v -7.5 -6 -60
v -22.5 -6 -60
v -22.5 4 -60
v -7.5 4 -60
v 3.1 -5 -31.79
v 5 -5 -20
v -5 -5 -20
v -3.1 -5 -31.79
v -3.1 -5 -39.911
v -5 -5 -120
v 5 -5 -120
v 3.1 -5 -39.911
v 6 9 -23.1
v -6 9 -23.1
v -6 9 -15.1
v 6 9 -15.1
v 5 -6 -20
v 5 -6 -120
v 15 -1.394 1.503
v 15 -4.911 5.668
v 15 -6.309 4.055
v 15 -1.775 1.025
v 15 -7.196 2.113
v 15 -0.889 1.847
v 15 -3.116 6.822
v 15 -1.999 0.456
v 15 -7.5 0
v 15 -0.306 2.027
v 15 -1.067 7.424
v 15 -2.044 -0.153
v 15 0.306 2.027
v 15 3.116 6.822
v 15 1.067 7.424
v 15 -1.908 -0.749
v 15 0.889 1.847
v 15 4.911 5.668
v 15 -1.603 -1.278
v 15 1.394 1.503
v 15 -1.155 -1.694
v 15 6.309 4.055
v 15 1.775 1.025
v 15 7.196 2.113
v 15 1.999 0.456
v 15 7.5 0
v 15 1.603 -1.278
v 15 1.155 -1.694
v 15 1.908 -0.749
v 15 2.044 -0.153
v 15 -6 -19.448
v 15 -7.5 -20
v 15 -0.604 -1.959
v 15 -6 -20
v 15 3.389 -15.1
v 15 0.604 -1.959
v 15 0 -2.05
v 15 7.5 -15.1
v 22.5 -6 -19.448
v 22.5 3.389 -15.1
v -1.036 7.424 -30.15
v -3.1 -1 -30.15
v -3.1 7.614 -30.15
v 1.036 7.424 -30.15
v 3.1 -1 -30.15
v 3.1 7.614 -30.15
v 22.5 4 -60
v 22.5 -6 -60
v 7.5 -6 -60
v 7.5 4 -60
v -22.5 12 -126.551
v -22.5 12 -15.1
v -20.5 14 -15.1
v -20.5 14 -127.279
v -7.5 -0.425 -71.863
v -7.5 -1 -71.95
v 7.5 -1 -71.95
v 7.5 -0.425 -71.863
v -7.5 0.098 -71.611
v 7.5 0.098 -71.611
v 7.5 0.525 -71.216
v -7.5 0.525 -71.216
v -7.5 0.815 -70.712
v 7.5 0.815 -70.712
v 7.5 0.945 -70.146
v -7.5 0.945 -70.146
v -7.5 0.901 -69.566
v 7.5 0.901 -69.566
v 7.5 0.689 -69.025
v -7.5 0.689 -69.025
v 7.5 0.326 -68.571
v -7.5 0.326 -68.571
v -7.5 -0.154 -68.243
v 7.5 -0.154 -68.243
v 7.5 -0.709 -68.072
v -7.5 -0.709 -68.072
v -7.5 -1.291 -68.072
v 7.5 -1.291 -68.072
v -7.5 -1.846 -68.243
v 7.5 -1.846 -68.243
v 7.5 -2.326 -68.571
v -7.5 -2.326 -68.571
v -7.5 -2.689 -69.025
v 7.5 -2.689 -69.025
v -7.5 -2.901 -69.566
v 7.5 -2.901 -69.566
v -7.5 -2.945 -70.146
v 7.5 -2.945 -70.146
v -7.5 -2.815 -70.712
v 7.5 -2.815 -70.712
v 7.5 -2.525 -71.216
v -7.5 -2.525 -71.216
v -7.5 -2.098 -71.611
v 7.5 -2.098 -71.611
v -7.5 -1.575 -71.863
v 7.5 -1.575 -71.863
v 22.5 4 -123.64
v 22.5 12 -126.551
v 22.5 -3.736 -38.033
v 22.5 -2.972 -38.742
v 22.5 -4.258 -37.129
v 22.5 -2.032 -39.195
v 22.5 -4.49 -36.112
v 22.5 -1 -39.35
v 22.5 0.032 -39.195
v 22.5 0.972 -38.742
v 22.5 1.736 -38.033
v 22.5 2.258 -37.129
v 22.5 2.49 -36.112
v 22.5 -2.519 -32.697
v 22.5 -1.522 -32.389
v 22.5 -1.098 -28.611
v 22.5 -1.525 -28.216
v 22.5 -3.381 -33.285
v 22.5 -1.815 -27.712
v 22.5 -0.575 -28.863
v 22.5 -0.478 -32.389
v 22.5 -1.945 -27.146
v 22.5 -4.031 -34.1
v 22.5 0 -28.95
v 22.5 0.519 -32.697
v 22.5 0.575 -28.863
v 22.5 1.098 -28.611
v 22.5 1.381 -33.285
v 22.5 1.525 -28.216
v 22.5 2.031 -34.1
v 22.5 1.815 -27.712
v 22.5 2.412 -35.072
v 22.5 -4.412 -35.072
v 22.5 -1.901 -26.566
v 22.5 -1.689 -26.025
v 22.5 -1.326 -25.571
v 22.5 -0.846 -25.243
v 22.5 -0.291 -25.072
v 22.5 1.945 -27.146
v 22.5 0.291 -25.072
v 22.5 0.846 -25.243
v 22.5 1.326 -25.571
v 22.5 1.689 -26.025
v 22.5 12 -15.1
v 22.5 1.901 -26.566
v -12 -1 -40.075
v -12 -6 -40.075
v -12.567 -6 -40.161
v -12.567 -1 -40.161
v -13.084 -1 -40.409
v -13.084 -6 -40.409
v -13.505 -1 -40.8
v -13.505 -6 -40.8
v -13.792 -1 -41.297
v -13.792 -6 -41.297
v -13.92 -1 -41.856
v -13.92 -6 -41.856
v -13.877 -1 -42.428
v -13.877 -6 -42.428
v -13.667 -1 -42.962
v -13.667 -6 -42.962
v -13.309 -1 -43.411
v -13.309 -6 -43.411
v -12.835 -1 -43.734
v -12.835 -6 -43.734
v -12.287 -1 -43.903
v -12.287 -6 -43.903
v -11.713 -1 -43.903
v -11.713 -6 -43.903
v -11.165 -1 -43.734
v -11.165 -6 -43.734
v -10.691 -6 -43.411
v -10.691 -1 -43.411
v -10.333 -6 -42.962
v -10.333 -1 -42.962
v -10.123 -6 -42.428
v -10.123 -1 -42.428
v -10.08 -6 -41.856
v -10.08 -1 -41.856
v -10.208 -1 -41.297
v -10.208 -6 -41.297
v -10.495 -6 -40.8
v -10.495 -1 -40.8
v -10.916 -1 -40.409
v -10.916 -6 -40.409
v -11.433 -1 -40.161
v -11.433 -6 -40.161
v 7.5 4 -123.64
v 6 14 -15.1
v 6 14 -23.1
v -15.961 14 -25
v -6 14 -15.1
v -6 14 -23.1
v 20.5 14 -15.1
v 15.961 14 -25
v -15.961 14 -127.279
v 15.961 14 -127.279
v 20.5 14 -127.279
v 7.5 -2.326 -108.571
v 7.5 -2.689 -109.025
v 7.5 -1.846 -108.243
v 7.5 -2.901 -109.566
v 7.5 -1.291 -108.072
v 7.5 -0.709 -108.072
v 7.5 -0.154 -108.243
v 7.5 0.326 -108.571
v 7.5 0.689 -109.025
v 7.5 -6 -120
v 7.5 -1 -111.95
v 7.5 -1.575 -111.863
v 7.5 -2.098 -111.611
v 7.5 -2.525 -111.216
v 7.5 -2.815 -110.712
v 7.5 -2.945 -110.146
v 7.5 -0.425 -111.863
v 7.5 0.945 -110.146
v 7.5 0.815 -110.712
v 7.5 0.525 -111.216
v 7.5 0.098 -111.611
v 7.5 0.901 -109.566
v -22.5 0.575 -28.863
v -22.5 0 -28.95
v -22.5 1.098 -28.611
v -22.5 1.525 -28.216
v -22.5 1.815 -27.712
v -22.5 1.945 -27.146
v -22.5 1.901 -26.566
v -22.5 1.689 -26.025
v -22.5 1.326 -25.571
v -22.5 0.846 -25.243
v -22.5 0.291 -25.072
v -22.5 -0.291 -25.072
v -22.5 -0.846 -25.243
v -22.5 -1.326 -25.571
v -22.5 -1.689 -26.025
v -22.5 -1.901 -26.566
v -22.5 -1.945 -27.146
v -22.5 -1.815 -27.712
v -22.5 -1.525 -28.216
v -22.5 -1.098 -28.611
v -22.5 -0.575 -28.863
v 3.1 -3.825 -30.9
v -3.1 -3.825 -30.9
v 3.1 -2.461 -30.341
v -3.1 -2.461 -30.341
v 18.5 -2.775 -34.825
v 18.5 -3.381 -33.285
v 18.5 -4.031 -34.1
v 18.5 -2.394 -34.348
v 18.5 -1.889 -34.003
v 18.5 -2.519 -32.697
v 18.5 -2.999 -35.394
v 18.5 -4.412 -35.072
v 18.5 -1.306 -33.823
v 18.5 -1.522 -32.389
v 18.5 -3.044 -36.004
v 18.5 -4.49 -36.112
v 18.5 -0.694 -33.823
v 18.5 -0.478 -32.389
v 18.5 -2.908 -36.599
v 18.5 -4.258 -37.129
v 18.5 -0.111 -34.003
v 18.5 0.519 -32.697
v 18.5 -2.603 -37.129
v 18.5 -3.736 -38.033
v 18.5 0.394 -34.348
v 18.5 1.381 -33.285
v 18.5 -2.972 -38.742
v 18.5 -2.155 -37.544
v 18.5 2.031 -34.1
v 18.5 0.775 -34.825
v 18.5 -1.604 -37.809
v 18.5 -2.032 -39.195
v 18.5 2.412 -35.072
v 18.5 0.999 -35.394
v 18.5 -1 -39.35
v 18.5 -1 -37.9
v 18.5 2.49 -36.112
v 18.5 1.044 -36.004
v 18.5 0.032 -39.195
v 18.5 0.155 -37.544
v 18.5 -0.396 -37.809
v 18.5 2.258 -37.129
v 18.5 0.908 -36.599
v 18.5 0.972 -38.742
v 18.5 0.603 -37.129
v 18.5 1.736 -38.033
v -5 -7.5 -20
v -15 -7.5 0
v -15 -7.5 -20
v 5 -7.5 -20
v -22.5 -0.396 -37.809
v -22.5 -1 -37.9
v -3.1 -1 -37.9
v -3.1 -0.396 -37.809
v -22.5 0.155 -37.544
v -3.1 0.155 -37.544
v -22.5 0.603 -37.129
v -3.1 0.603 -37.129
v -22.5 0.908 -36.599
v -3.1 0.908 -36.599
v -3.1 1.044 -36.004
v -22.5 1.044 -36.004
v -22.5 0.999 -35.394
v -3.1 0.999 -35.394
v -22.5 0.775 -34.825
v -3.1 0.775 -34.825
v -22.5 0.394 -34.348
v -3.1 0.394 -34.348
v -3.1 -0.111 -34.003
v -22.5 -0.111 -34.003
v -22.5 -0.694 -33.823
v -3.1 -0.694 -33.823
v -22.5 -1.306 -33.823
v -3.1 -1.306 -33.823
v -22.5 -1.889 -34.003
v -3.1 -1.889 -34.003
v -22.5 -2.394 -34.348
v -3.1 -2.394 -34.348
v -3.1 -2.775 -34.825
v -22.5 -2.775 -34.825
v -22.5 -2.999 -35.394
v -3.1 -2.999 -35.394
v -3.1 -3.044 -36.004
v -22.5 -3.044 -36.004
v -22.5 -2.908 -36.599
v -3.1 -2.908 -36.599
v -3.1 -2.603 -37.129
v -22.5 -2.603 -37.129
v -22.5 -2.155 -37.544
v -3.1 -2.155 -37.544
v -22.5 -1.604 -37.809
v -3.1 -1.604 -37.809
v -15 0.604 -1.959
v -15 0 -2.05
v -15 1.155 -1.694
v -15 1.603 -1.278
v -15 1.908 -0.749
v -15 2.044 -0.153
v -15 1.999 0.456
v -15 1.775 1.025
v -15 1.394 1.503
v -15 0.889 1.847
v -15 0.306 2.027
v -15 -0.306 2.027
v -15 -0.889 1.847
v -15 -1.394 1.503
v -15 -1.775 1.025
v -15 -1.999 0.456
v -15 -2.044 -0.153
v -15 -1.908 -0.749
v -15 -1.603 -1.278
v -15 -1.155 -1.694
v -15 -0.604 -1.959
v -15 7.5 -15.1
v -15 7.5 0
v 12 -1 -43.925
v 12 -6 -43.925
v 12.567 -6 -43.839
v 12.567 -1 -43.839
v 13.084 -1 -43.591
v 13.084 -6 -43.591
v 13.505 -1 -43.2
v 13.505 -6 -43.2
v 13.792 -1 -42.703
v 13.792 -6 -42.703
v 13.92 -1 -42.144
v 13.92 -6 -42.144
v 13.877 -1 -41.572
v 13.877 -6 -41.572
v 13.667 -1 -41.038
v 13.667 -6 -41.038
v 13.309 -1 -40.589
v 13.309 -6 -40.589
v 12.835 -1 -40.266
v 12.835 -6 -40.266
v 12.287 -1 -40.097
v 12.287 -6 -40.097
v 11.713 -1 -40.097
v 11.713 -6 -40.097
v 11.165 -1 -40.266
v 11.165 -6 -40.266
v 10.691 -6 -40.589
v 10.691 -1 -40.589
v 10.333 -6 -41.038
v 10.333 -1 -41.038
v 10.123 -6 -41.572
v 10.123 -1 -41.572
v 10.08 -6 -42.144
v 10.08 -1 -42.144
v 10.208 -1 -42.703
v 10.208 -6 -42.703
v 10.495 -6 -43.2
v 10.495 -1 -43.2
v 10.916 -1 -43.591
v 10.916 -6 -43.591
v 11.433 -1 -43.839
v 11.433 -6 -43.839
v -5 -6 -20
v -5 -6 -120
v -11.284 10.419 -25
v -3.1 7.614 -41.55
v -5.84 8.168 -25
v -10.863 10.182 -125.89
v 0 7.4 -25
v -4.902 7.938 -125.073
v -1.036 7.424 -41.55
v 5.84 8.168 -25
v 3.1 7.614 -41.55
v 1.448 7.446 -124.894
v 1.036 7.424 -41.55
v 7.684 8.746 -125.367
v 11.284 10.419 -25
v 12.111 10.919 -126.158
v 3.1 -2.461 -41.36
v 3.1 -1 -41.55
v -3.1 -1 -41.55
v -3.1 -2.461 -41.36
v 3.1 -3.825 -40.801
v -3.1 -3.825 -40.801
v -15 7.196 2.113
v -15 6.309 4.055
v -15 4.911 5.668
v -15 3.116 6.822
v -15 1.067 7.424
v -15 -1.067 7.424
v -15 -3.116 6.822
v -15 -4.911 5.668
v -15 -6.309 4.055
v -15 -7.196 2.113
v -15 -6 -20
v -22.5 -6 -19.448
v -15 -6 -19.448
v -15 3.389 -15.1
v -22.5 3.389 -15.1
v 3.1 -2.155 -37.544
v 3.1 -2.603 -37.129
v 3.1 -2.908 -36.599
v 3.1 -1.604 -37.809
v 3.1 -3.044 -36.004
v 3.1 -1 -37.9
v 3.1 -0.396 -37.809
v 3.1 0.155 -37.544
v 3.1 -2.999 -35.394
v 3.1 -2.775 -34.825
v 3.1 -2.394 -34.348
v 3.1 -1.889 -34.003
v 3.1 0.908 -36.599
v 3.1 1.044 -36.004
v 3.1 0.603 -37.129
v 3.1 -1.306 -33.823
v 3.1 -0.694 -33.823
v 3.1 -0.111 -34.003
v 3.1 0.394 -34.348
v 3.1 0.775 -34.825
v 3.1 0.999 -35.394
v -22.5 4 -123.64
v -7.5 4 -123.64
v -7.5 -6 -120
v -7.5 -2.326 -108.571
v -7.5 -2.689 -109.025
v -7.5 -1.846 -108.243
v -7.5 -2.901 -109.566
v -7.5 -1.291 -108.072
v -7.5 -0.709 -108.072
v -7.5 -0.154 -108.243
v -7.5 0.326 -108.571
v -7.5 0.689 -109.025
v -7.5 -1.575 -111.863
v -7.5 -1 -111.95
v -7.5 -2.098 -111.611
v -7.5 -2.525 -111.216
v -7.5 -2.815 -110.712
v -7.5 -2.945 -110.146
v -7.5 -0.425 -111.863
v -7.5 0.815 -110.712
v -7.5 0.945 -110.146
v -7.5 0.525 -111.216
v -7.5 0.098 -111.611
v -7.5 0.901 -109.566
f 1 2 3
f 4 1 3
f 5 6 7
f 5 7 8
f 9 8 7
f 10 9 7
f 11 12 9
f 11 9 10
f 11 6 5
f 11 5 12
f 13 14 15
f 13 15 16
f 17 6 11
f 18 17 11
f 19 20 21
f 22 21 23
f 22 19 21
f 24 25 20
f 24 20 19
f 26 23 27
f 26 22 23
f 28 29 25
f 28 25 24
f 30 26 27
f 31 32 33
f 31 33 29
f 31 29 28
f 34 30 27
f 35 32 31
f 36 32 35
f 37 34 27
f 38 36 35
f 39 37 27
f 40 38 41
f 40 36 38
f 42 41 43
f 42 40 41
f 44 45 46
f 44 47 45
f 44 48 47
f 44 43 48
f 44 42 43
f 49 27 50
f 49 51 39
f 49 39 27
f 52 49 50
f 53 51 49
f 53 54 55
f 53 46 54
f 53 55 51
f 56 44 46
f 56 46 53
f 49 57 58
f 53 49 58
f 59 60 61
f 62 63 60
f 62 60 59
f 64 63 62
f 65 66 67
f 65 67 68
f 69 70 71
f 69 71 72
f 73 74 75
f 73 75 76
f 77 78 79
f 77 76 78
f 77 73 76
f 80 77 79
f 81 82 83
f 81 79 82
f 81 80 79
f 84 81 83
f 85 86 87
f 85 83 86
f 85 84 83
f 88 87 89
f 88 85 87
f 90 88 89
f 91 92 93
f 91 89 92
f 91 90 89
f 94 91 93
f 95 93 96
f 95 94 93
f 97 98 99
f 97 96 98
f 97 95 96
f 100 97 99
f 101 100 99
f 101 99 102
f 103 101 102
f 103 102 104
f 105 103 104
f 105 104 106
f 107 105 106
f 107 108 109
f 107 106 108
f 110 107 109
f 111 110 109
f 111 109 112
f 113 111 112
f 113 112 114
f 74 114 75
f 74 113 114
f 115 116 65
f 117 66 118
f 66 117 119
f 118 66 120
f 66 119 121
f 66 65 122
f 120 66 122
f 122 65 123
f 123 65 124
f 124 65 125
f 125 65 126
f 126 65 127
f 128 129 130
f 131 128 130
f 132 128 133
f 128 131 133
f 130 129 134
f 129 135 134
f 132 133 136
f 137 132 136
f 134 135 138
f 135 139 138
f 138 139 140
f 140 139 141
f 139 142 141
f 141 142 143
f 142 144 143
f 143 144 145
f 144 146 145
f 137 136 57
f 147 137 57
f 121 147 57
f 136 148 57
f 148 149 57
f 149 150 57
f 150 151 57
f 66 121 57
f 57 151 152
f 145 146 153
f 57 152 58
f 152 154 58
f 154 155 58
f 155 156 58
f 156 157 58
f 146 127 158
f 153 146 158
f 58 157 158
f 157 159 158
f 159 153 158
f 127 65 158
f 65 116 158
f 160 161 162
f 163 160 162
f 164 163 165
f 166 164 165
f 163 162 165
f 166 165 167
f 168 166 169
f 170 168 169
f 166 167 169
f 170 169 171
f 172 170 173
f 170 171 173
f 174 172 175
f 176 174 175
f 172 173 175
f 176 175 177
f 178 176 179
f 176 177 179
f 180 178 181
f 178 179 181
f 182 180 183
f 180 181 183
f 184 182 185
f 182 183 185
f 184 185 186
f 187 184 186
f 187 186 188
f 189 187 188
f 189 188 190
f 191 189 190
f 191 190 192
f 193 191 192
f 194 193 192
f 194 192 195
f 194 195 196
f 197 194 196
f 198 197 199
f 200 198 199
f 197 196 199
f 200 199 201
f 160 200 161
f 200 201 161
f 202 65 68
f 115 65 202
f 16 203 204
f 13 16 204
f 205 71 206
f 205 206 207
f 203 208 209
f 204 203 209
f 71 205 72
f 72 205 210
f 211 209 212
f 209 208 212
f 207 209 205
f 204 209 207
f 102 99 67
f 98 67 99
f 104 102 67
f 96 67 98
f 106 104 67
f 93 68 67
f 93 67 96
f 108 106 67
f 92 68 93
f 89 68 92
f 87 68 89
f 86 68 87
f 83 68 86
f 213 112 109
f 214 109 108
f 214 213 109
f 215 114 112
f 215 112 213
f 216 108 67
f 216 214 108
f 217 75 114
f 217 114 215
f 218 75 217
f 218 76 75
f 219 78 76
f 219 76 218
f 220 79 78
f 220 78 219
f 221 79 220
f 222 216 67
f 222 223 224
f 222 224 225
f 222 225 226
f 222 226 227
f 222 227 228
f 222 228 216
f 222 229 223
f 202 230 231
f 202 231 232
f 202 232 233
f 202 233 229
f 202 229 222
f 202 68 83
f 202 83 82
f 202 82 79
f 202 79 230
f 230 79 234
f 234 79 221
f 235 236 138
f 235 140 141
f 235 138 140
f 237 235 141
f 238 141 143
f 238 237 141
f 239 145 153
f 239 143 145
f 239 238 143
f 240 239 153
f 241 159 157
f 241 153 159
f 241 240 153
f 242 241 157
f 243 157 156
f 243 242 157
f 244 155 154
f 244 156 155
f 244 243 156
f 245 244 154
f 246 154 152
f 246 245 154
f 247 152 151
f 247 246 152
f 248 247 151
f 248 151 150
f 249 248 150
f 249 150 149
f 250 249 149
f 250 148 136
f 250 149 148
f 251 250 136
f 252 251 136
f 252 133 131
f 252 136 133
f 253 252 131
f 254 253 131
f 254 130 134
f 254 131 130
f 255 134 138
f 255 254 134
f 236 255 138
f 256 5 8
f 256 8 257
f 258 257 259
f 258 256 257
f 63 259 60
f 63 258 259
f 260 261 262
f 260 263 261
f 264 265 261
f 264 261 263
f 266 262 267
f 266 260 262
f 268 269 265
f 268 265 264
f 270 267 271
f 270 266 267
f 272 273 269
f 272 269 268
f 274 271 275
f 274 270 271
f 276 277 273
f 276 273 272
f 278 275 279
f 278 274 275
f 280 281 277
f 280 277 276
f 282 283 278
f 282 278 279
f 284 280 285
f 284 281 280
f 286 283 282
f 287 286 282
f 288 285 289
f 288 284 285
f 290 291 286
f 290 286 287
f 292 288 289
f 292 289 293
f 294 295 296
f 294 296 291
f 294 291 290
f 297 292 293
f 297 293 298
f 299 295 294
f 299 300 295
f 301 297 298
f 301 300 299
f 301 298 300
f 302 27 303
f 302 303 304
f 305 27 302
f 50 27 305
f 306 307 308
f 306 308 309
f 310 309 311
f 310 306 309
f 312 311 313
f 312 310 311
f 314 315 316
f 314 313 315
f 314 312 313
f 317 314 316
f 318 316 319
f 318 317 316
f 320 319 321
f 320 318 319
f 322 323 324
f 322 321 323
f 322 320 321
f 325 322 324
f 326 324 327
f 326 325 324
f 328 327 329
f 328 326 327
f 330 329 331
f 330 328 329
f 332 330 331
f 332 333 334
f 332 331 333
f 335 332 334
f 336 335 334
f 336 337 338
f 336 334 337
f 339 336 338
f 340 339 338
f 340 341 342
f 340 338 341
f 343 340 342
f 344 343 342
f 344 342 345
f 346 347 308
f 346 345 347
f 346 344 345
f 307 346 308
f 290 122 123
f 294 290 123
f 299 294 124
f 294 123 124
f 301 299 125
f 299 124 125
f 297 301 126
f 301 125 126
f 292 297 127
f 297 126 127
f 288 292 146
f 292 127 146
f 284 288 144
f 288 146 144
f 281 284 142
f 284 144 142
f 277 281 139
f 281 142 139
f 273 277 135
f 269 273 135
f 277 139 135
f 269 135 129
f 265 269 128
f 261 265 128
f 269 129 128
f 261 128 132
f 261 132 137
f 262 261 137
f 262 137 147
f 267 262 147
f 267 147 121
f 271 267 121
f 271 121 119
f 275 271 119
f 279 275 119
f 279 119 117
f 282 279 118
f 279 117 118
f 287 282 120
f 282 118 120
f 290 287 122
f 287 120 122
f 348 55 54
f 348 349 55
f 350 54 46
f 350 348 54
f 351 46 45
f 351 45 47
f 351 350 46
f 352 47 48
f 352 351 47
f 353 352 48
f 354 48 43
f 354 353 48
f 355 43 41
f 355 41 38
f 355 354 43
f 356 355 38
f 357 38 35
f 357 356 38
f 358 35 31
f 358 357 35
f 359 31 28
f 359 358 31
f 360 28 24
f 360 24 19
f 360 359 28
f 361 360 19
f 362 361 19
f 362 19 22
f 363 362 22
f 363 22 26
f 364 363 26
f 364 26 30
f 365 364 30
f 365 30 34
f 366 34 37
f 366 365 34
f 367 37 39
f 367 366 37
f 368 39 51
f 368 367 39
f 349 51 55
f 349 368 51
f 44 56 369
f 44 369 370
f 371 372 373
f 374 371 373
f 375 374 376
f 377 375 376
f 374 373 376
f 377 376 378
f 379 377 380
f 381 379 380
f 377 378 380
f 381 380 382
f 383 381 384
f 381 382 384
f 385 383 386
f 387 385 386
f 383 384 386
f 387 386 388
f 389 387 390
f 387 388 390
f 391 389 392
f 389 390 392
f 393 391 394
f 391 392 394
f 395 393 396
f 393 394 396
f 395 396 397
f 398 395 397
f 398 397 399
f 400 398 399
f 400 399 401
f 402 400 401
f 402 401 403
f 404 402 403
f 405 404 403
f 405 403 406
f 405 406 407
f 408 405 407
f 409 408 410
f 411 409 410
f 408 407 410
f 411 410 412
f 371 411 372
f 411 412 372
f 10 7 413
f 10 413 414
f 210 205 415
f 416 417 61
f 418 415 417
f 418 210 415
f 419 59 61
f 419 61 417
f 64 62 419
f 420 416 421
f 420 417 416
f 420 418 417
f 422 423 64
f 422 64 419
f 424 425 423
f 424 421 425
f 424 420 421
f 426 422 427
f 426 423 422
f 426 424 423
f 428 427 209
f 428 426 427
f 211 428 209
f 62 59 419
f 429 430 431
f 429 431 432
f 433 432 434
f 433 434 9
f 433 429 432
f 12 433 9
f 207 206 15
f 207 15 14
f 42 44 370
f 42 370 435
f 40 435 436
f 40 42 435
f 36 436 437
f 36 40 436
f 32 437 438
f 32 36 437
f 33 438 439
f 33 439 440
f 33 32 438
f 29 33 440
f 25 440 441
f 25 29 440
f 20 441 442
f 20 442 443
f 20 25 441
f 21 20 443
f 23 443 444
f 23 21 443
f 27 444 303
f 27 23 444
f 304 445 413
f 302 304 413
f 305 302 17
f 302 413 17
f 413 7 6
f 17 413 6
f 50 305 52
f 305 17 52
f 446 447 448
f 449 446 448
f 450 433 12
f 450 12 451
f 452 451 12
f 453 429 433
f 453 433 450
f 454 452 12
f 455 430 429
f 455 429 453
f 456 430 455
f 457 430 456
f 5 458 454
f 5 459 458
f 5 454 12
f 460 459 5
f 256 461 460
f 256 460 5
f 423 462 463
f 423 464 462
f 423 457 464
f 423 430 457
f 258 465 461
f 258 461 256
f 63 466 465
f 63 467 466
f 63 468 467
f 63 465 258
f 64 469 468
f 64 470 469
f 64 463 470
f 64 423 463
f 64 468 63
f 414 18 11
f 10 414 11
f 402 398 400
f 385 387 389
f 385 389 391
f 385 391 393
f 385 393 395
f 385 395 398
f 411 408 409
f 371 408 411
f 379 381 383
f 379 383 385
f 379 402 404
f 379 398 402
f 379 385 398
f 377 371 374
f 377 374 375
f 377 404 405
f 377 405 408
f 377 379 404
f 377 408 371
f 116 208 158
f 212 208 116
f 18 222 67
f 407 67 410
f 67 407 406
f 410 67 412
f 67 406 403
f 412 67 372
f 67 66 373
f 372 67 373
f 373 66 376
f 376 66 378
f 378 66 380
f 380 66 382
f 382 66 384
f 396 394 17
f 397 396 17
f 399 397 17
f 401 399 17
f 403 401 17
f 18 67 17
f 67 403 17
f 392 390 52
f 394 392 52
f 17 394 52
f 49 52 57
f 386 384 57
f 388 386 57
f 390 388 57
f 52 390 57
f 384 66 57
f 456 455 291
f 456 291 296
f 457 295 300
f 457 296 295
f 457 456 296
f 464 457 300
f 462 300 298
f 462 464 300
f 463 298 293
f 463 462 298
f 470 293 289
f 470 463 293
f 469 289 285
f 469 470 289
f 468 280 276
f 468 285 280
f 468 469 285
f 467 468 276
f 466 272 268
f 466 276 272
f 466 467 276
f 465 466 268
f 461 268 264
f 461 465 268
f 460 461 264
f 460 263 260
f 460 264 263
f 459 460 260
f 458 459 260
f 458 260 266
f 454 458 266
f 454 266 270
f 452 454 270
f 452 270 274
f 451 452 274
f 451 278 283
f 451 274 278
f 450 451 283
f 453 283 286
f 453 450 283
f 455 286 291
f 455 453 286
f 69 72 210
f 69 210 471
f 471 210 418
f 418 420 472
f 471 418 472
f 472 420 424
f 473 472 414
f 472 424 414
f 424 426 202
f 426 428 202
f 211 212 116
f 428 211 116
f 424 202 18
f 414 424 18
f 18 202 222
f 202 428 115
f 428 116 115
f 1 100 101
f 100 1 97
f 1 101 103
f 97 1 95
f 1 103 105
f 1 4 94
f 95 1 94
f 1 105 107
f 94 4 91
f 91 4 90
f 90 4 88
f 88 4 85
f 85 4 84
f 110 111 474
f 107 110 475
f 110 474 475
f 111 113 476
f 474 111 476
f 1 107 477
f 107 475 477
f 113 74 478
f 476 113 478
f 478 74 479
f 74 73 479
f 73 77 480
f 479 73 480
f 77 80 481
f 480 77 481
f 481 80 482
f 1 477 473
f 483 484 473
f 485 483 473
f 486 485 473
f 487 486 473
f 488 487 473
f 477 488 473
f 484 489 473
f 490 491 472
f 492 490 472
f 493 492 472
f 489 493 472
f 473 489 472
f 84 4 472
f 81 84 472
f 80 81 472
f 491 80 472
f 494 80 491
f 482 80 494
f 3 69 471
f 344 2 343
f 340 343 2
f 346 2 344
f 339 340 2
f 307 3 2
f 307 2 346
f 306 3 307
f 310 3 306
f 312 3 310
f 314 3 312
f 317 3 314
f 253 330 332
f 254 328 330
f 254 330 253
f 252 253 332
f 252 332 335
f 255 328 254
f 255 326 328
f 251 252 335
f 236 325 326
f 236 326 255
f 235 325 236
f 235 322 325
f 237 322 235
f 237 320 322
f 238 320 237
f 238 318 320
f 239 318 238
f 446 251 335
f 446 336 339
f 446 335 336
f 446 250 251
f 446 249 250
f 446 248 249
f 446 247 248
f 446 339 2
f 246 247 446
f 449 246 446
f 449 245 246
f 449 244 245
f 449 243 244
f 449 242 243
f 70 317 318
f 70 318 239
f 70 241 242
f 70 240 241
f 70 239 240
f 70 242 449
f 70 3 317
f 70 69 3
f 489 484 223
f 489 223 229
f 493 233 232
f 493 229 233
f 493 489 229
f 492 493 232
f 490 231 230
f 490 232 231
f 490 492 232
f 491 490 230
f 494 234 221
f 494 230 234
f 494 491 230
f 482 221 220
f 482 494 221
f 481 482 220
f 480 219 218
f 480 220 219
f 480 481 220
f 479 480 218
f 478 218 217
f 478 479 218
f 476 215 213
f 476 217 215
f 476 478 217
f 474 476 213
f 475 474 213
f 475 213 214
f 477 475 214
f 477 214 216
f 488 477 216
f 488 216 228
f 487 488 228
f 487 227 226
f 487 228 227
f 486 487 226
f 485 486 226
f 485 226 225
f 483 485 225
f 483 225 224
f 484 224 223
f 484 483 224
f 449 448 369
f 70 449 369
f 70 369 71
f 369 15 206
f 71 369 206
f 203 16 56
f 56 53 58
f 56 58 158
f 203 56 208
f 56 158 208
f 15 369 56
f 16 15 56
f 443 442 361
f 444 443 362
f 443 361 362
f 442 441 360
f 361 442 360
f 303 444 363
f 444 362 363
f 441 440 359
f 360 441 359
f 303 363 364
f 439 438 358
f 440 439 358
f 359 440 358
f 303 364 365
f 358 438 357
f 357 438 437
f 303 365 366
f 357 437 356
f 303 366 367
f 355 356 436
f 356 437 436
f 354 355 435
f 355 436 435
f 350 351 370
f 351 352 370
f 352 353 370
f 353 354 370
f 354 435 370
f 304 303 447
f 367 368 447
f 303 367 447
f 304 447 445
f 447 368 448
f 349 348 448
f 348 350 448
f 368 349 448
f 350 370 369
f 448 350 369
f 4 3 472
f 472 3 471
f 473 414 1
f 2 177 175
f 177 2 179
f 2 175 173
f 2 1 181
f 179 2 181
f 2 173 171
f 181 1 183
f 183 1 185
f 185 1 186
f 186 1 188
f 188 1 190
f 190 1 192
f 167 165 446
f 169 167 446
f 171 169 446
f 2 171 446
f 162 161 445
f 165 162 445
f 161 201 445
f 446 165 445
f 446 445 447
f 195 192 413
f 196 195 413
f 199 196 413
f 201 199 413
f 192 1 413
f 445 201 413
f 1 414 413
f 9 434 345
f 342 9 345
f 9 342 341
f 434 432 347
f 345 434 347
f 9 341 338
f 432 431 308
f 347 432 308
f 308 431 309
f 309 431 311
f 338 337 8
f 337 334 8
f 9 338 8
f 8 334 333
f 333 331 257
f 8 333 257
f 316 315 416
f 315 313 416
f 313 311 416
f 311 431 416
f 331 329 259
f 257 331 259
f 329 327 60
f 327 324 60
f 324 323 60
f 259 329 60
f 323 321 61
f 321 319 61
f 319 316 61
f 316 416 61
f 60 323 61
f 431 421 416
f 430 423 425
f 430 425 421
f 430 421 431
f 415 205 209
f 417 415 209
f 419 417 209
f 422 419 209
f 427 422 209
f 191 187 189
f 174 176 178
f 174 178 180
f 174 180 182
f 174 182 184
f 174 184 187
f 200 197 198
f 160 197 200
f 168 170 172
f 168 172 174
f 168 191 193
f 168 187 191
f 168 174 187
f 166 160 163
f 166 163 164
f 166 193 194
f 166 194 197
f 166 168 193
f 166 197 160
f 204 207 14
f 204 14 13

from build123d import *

# Parameters (mm, degrees)
SKETCH_1_R               = 7.5
SKETCH_1_R_2             = 2.05
EXTRUDE_1_DEPTH          = 15
EXTRUDE_2_DEPTH          = 22.5
SKETCH_3_R               = 22.6
CUT_EXTRUDE_1_DEPTH      = 125
SKETCH_5_W               = 80
SKETCH_5_H               = 15
CUT_EXTRUDE_2_DEPTH      = 15
CUT_EXTRUDE_3_DEPTH      = 131.008833765
CUT_EXTRUDE_3_DEPTH_BACK = 131.008833765
SKETCH_6_R               = 1.95
CUT_EXTRUDE_4_DEPTH      = 131.008833765
CUT_EXTRUDE_4_DEPTH_BACK = 131.008833765
SKETCH_10_R              = 1.95
CUT_EXTRUDE_5_DEPTH      = 131.008833765
CUT_EXTRUDE_5_DEPTH_BACK = 131.008833765
SKETCH_11_R              = 2.05
CUT_EXTRUDE_6_DEPTH      = 3.1
SKETCH_16_W              = 100
SKETCH_16_H              = 15.085035438
CUT_EXTRUDE_7_DEPTH      = 5
CHAMFER_1_SIZE           = 2
SKETCH_17_R              = 3.5
CUT_EXTRUDE_8_DEPTH      = 4
SKETCH_19_W              = 12
SKETCH_19_H              = 8
CUT_EXTRUDE_10_DEPTH     = 5
SKETCH_20_W              = 30
SKETCH_20_H              = 18.196576595
CUT_EXTRUDE_12_DEPTH     = 1.5
SKETCH_21_R              = 1.925
CUT_EXTRUDE_13_DEPTH     = 5


with BuildPart() as part:
    # 스케치1 → 보스-돌출1 (new, symmetric)
    # profile 1 of 2: a face of its own
    with BuildSketch(Plane(origin=(0, 0, 0), x_dir=(0, 0, -1), z_dir=(1, 0, 0))):
        with BuildLine():
            ThreePointArc((7.5, 0), (5.303300859, -5.303300859), (0, -7.5))
            Line((0, -7.5), (37.938480529, -7.5))
            Line((37.938480529, -7.5), (36.613399157, 7.5))
            Line((36.613399157, 7.5), (0, 7.5))
            ThreePointArc((0, 7.5), (5.303300859, 5.303300859), (7.5, 0))
        make_face()
    # profile 2 of 2: a face of its own
    with BuildSketch(Plane(origin=(0, 0, 0), x_dir=(0, 0, -1), z_dir=(1, 0, 0))):
        Circle(SKETCH_1_R)
        Circle(SKETCH_1_R_2, mode=Mode.SUBTRACT)
    extrude(amount=EXTRUDE_1_DEPTH, both=True)

    # 스케치2 → 보스-돌출2 (add, symmetric)
    with BuildSketch(Plane(origin=(0, 0, 0), x_dir=(0, 0, -1), z_dir=(1, 0, 0))):
        Polygon((15.1, 3.389248282), (15.1, 14), (127.279404685, 14), (120, -6), (19.447603562, -6), align=None)
    extrude(amount=EXTRUDE_2_DEPTH, both=True)

    # 스케치3 → 컷-돌출1 (cut)
    with BuildSketch(Plane.XY.offset(-150)):
        with Locations((0, 30)):
            Circle(SKETCH_3_R)
    extrude(amount=CUT_EXTRUDE_1_DEPTH, mode=Mode.SUBTRACT)

    # 스케치5 → 컷-돌출2 (cut)
    with BuildSketch(Plane(origin=(22.5, 0, 0), x_dir=(0, 0, -1), z_dir=(1, 0, 0))):
        with Locations((100, -3.5)):
            Rectangle(SKETCH_5_W, SKETCH_5_H)
    cut_extrude_2 = extrude(amount=-CUT_EXTRUDE_2_DEPTH, mode=Mode.SUBTRACT)

    # 대칭 복사1: 컷-돌출2 across plane
    add(cut_extrude_2.mirror(Plane(origin=(0, 0, 0), x_dir=(0, 0, 1), z_dir=(1, 0, 0))), mode=Mode.SUBTRACT)

    # 스케치6 → 컷-돌출3 (cut, two sides: drawn at the far end of the back side and taken through both)
    with BuildSketch(Plane(origin=(0, 0, 0), x_dir=(0, 0, -1), z_dir=(1, 0, 0)).offset(-CUT_EXTRUDE_3_DEPTH_BACK)):
        with Locations((70, -1)):
            Circle(SKETCH_6_R)
        with Locations((110, -1)):
            Circle(SKETCH_6_R)
    extrude(amount=CUT_EXTRUDE_3_DEPTH + CUT_EXTRUDE_3_DEPTH_BACK, mode=Mode.SUBTRACT)

    # 스케치10 → 컷-돌출4 (cut, two sides: drawn at the far end of the back side and taken through both)
    with BuildSketch(Plane(origin=(0, 0, 0), x_dir=(0, 0, -1), z_dir=(1, 0, 0)).offset(-CUT_EXTRUDE_4_DEPTH_BACK)):
        with Locations((27, 0)):
            Circle(SKETCH_10_R)
    extrude(amount=CUT_EXTRUDE_4_DEPTH + CUT_EXTRUDE_4_DEPTH_BACK, mode=Mode.SUBTRACT)

    # 스케치11 → 컷-돌출5 (cut, two sides: drawn at the far end of the back side and taken through both)
    with BuildSketch(Plane(origin=(0, 0, 0), x_dir=(0, 0, -1), z_dir=(1, 0, 0)).offset(-CUT_EXTRUDE_5_DEPTH_BACK)):
        with Locations((35.850364983, -1)):
            Circle(SKETCH_11_R)
    extrude(amount=CUT_EXTRUDE_5_DEPTH + CUT_EXTRUDE_5_DEPTH_BACK, mode=Mode.SUBTRACT)

    # 스케치12 → 컷-돌출6 (cut, symmetric)
    with BuildSketch(Plane(origin=(0, 0, 0), x_dir=(0, 0, -1), z_dir=(1, 0, 0))):
        with BuildLine():
            Line((30.150364983, -1), (30.150364983, 12.943670284))
            ThreePointArc((30.150364983, 12.943670284), (35.850364983, 18.643670284), (41.550364983, 12.943670284))
            Line((41.550364983, 12.943670284), (41.550364983, -1))
            ThreePointArc((41.550364983, -1), (35.850364983, -6.7), (30.150364983, -1))
        make_face()
    extrude(amount=CUT_EXTRUDE_6_DEPTH, both=True, mode=Mode.SUBTRACT)

    # 스케치16 → 컷-돌출7 (cut, symmetric)
    with BuildSketch(Plane(origin=(0, 0, 0), x_dir=(0, 0, -1), z_dir=(1, 0, 0))):
        with Locations((70, -12.542517719)):
            Rectangle(SKETCH_16_W, SKETCH_16_H)
    extrude(amount=CUT_EXTRUDE_7_DEPTH, both=True, mode=Mode.SUBTRACT)

    # 모따기1
    chamfer_1_edges = [part.edges().sort_by_distance(p)[0] for p in [
        (-22.5, 14, -71.189702343),
        (22.5, 14, -71.189702343),
    ]]
    chamfer(chamfer_1_edges, length=CHAMFER_1_SIZE)

    # 스케치17 → 컷-돌출8 (cut)
    with BuildSketch(Plane(origin=(22.5, 0, 0), x_dir=(0, 0, -1), z_dir=(1, 0, 0))):
        with Locations((35.850364983, -1)):
            Circle(SKETCH_17_R)
    extrude(amount=-CUT_EXTRUDE_8_DEPTH, mode=Mode.SUBTRACT)

    # 스케치19 → 컷-돌출10 (cut)
    with BuildSketch(Plane(origin=(0, 14, 0), x_dir=(1, 0, 0), z_dir=(0, 1, 0))):
        with Locations((0, 19.1)):
            Rectangle(SKETCH_19_W, SKETCH_19_H)
    extrude(amount=-CUT_EXTRUDE_10_DEPTH, mode=Mode.SUBTRACT)

    # 스케치20 → 컷-돌출12 (cut)
    with BuildSketch(Plane.XZ.offset(6)):
        with Locations((0, -29.098288298)):
            Rectangle(SKETCH_20_W, SKETCH_20_H)
    extrude(amount=CUT_EXTRUDE_12_DEPTH, mode=Mode.SUBTRACT)

    # 스케치21 → 컷-돌출13 (cut)
    with BuildSketch(Plane.XZ.offset(6)):
        with Locations(Location((12, -42, 0), (0, 0, 270))):
            Circle(SKETCH_21_R)
        with Locations(Location((-12, -42, 0), (0, 0, 90))):
            Circle(SKETCH_21_R)
    extrude(amount=-CUT_EXTRUDE_13_DEPTH, mode=Mode.SUBTRACT)


solid = part.part
